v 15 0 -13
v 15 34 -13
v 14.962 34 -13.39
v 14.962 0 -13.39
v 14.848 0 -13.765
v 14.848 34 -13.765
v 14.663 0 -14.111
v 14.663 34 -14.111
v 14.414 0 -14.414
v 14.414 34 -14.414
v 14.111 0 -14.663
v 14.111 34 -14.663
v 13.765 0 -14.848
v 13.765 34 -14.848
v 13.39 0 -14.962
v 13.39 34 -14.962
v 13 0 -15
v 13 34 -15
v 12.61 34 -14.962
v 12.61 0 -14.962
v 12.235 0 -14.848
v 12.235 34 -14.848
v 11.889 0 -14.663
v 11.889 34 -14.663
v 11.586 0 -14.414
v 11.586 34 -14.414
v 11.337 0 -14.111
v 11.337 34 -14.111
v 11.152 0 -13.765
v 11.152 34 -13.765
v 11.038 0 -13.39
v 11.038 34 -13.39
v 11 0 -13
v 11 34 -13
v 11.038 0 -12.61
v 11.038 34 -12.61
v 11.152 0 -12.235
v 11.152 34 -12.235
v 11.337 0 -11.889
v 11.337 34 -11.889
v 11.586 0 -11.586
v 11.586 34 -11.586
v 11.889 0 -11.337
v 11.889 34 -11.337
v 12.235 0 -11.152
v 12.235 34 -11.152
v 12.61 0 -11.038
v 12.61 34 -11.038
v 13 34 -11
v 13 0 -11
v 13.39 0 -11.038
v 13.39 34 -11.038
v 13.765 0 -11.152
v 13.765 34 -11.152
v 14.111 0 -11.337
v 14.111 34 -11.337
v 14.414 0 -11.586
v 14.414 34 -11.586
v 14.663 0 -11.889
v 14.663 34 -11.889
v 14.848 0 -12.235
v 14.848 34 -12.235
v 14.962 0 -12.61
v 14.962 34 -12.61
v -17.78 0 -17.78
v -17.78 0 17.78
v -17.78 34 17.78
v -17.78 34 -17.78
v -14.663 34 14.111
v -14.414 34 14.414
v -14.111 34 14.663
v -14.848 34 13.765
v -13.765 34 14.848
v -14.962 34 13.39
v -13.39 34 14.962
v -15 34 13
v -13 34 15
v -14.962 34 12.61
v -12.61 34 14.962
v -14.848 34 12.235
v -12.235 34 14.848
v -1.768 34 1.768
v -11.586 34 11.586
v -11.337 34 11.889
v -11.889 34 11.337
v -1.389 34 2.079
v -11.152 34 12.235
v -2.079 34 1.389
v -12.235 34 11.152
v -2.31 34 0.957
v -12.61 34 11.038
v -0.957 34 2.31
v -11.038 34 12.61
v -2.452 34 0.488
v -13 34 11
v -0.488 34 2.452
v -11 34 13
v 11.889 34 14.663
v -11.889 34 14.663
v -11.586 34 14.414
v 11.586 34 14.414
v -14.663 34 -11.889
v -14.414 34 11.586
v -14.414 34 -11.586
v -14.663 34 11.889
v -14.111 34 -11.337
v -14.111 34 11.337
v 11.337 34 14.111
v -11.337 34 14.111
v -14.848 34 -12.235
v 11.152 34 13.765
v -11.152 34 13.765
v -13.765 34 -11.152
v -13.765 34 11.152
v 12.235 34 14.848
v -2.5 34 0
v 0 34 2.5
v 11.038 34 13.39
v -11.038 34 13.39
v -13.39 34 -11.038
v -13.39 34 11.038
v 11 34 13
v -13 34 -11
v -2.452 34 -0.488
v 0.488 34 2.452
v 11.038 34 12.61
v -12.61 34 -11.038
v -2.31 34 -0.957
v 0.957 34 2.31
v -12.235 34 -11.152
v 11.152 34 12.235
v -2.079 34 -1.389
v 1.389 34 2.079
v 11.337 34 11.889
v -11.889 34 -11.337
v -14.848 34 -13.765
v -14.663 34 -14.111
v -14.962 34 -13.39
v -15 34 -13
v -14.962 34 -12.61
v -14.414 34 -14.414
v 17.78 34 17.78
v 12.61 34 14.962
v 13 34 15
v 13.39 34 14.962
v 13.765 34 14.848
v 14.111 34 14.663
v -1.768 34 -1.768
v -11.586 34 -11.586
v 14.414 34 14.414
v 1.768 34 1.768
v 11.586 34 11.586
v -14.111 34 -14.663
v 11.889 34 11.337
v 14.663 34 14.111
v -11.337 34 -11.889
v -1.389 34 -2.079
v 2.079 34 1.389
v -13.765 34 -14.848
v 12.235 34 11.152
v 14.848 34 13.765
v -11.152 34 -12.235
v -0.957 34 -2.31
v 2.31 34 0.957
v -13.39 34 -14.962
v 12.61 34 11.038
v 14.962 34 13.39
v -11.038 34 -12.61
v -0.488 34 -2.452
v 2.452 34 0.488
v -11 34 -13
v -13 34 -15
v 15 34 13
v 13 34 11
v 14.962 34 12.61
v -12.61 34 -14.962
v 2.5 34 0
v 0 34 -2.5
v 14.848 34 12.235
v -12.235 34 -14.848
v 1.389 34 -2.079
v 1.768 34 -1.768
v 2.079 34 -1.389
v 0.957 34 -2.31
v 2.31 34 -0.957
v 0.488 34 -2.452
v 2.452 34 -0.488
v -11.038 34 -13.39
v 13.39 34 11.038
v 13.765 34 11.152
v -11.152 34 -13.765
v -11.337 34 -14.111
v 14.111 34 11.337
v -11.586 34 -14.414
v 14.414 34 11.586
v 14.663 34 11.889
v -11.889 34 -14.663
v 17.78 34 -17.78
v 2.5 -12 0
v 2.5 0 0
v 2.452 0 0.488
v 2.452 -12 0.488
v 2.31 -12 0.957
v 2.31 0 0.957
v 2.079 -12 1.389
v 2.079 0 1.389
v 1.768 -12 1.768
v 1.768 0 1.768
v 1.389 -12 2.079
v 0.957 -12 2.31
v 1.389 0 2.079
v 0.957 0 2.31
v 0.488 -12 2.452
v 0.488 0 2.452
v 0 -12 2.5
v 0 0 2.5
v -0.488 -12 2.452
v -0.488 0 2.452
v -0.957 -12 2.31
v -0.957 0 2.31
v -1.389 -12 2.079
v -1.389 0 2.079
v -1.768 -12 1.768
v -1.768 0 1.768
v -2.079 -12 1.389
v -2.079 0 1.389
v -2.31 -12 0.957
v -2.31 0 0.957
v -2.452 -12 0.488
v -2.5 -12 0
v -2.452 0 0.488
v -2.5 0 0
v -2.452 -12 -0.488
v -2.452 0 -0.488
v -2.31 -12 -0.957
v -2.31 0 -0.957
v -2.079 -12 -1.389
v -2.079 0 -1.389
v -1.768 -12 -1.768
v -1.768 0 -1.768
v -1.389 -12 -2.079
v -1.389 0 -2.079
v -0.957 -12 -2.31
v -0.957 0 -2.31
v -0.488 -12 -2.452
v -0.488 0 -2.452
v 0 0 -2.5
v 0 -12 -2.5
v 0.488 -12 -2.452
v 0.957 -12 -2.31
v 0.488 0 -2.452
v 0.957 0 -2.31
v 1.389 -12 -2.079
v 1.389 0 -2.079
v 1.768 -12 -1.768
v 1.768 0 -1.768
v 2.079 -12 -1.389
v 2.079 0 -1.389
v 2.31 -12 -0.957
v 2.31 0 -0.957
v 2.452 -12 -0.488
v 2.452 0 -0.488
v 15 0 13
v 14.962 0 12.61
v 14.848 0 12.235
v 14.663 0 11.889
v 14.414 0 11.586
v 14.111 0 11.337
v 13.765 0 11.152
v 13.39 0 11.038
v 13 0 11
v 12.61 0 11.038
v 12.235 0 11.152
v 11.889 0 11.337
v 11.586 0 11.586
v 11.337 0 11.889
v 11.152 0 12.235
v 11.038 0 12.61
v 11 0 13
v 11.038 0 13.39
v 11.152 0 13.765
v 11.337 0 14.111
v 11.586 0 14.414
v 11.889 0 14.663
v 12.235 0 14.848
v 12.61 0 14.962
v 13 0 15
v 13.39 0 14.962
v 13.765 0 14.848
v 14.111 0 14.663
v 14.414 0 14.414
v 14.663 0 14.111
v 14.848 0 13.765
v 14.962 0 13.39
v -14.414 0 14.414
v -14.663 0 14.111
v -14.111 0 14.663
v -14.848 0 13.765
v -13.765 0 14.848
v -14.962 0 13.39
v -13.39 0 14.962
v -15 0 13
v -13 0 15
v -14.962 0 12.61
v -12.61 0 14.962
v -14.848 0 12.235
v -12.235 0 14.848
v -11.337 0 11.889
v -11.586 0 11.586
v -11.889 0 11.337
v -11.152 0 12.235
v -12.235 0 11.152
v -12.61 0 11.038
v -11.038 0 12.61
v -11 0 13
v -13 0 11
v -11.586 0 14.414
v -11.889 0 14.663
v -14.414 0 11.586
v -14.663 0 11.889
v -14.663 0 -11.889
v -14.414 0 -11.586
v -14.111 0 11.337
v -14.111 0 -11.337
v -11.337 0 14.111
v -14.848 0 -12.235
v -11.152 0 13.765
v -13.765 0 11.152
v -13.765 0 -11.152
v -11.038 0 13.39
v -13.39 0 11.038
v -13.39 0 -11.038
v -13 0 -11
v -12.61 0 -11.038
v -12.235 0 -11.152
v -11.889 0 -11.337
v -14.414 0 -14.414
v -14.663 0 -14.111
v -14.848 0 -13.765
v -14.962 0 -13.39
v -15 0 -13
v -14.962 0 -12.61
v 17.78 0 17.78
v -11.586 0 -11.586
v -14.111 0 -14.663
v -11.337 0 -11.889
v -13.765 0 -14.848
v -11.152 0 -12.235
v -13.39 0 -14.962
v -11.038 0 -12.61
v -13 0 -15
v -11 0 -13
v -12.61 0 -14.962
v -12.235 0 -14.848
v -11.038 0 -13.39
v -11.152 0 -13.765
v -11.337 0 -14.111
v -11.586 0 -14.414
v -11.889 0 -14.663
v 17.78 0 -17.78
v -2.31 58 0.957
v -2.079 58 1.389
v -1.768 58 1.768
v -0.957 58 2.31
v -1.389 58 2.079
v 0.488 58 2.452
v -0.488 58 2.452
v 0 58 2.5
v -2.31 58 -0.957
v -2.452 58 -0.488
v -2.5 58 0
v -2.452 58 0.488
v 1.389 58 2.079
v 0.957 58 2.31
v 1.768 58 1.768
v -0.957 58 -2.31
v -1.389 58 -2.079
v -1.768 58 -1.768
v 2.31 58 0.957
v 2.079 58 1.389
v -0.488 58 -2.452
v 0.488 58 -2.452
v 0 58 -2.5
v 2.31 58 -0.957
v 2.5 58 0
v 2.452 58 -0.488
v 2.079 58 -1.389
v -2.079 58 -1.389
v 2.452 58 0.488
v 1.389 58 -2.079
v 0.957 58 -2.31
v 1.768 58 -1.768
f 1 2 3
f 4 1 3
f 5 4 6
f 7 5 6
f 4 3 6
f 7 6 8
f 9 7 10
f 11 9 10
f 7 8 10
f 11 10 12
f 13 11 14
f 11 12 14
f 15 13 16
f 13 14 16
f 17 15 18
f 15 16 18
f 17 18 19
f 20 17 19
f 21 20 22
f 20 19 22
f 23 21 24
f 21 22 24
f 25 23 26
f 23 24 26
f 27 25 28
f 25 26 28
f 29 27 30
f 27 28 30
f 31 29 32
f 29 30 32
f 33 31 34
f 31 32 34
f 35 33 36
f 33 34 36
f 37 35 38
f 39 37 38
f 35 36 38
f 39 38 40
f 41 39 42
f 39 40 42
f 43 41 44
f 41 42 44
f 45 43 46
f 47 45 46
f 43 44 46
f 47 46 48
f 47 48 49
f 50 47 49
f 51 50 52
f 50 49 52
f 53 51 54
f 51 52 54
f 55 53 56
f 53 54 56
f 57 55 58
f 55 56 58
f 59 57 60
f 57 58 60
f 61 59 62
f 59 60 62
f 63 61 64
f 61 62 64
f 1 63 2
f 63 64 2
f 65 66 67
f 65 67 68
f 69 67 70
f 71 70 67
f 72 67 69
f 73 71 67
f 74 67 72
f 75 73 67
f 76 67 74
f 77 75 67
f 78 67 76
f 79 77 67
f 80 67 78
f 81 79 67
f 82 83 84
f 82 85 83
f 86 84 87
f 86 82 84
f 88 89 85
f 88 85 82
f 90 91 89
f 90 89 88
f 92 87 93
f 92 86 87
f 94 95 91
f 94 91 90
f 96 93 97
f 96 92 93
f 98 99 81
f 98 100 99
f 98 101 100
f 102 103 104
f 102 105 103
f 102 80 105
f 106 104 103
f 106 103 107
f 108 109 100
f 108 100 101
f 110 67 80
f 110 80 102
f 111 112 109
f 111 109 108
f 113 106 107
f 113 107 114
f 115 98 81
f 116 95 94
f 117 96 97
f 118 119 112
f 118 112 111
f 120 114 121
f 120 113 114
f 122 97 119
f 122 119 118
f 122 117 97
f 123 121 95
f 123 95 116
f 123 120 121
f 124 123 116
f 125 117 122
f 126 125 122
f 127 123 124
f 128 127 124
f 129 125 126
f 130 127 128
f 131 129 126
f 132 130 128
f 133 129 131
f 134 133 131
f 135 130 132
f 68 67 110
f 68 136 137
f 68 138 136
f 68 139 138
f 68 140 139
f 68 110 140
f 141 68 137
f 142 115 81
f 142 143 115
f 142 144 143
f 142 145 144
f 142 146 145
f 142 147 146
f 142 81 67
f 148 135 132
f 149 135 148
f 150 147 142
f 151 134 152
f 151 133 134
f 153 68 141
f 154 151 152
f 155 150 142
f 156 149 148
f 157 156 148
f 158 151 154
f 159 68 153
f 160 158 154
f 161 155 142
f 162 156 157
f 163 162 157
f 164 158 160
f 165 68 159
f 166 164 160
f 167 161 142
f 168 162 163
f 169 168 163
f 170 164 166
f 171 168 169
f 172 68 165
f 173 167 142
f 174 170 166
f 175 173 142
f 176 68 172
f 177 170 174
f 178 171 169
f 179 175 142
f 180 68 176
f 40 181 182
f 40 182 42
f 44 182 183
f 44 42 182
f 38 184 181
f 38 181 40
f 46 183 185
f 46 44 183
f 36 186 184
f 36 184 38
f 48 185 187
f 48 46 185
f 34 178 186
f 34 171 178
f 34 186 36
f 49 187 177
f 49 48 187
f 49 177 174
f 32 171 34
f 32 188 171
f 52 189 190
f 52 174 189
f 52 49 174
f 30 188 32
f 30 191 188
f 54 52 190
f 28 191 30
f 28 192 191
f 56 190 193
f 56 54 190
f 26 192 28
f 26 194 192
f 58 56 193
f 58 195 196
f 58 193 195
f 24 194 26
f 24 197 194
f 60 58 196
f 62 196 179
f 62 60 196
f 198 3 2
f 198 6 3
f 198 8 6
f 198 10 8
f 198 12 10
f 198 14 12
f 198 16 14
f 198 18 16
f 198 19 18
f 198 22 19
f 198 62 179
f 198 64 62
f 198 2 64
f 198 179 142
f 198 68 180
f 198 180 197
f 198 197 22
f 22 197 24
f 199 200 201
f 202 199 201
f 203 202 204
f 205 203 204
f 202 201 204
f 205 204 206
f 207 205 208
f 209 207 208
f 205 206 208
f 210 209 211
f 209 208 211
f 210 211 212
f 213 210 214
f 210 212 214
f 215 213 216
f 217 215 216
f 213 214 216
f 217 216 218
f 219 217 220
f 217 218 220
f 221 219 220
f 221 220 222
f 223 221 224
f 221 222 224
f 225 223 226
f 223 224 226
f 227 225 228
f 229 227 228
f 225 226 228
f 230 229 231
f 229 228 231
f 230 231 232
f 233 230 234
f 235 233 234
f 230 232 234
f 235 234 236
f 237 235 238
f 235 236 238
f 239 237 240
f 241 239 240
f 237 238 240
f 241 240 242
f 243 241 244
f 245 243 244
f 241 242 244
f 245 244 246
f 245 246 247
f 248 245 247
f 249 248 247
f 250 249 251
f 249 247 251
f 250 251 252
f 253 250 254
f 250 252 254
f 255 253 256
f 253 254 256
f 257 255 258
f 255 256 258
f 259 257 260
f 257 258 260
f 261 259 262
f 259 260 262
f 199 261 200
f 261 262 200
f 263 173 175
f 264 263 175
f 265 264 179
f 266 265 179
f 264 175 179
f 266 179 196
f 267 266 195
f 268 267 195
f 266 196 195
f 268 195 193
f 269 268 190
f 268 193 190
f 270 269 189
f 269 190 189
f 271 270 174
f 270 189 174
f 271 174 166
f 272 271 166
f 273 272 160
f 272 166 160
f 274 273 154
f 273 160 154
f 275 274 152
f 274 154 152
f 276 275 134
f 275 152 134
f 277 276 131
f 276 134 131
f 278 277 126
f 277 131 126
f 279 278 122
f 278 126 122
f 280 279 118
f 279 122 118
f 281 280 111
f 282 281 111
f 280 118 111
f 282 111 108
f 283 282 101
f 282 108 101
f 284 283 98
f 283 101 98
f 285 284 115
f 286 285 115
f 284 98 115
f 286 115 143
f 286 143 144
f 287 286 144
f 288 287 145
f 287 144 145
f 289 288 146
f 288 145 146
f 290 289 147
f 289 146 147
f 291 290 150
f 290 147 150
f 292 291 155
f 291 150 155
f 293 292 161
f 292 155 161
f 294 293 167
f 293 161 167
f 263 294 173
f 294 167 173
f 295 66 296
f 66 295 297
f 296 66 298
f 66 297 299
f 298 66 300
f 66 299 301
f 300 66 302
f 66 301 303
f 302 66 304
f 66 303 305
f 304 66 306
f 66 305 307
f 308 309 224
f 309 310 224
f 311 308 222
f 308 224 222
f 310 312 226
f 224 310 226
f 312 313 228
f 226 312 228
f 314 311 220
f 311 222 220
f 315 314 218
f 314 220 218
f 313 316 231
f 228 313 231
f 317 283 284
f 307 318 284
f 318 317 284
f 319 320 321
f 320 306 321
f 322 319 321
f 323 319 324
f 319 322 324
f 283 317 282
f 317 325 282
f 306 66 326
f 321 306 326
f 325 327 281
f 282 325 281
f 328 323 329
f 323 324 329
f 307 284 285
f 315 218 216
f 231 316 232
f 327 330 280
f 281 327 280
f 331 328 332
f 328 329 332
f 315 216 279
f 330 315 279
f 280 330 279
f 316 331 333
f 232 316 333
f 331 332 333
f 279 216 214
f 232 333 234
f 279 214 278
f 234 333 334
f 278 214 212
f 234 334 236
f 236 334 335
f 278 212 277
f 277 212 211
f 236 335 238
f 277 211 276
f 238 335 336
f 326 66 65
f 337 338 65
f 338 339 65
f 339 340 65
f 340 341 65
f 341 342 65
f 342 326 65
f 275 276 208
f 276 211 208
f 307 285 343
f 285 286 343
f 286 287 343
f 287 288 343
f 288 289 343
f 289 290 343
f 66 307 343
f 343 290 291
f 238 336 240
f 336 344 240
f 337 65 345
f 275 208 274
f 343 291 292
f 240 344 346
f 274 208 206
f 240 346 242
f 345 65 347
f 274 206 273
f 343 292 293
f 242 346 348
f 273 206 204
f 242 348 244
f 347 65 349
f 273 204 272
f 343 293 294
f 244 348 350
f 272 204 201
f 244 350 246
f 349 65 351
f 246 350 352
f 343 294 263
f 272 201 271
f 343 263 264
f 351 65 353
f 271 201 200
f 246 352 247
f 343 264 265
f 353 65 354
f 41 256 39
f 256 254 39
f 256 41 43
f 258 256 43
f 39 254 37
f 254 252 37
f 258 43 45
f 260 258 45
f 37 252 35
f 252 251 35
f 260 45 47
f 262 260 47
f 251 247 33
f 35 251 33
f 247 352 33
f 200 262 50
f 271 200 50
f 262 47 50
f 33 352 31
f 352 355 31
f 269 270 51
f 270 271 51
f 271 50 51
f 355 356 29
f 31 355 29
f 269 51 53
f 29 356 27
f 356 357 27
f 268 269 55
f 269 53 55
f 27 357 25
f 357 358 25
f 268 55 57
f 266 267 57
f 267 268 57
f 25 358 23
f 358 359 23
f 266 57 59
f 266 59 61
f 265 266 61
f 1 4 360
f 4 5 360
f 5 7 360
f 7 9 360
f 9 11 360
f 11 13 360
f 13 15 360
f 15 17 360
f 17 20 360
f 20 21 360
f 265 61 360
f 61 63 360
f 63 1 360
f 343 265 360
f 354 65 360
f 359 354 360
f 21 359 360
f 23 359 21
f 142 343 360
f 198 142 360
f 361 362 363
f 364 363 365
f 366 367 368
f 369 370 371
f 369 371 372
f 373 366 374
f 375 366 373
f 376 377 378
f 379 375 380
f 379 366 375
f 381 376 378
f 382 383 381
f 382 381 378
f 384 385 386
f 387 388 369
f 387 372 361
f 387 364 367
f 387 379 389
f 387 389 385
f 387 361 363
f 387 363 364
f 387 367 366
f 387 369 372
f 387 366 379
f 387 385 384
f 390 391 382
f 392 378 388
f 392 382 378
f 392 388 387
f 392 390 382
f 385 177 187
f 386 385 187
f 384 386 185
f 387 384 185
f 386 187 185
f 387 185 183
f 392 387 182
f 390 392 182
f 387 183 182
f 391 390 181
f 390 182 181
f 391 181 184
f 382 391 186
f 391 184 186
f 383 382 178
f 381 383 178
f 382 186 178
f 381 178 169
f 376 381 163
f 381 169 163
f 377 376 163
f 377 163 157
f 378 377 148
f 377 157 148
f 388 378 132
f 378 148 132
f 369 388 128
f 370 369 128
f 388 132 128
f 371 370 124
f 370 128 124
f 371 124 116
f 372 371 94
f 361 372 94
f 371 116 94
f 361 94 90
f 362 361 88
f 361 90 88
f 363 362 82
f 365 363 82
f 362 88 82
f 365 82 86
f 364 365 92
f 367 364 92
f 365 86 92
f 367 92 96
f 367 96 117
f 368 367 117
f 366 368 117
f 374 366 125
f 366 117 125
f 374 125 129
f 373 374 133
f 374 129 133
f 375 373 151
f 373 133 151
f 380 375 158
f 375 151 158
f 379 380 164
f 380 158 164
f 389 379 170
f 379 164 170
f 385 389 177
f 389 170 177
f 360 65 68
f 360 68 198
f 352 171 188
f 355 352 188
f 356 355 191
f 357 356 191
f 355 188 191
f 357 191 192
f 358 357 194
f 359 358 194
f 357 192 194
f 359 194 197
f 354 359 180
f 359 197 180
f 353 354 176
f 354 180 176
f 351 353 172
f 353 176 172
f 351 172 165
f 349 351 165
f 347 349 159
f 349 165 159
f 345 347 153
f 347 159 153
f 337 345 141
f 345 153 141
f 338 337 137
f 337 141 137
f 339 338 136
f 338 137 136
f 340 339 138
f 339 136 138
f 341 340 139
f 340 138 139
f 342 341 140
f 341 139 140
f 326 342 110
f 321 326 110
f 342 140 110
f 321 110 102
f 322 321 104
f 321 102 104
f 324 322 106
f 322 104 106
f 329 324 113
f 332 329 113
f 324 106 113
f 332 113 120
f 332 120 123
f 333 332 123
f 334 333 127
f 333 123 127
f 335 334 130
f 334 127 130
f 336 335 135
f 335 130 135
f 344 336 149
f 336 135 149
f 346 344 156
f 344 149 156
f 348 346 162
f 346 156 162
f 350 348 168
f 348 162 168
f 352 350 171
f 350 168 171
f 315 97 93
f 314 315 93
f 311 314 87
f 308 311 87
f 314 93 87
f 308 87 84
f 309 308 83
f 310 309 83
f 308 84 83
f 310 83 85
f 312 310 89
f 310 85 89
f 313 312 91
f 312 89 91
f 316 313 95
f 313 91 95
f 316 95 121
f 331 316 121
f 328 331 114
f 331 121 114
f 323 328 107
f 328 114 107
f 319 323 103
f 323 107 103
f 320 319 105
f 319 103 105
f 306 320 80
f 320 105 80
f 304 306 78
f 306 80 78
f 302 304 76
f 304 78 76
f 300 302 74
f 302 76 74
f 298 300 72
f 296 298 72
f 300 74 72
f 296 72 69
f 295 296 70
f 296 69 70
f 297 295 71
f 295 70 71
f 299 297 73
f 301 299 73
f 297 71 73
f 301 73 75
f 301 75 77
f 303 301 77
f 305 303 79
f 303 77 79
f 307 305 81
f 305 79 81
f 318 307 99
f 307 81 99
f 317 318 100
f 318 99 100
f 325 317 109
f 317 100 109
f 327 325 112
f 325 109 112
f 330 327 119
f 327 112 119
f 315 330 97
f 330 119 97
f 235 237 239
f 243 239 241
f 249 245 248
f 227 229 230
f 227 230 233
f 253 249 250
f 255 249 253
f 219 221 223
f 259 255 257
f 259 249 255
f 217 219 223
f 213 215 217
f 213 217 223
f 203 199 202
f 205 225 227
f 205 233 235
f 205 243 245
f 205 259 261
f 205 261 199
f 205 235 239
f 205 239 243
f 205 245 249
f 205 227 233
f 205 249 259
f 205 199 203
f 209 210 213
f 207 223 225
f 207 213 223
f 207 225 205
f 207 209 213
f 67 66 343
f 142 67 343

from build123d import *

# Parameters (mm, degrees)
SKETCH1_W           = 35.56
SKETCH1_H           = 35.56
BOSS_EXTRUDE1_DEPTH = 34
SKETCH2_R           = 2.5
BOSS_EXTRUDE2_DEPTH = 24
SKETCH3_R           = 2.5
BOSS_EXTRUDE3_DEPTH = 12
SKETCH4_R           = 2
CUT_EXTRUDE1_DEPTH  = 34


with BuildPart() as part:
    # Sketch1 → Boss-Extrude1 (new body)
    with BuildSketch(Plane(origin=(0, 0, 0), x_dir=(1, 0, 0), z_dir=(0, 1, 0))):
        Rectangle(SKETCH1_W, SKETCH1_H)
    extrude(amount=BOSS_EXTRUDE1_DEPTH)

    # Sketch2 → Boss-Extrude2 (add)
    with BuildSketch(Plane(origin=(0, 34, 0), x_dir=(1, 0, 0), z_dir=(0, 1, 0))):
        Circle(SKETCH2_R)
    extrude(amount=BOSS_EXTRUDE2_DEPTH)

    # Sketch3 → Boss-Extrude3 (add)
    with BuildSketch(Plane.XZ):
        Circle(SKETCH3_R)
    extrude(amount=BOSS_EXTRUDE3_DEPTH)

    # Sketch4 → Cut-Extrude1 (cut)
    with BuildSketch(Plane(origin=(0, 34, 0), x_dir=(1, 0, 0), z_dir=(0, 1, 0))):
        with Locations((-13, 13)):
            Circle(SKETCH4_R)
        with Locations((13, 13)):
            Circle(SKETCH4_R)
        with Locations((13, -13)):
            Circle(SKETCH4_R)
        with Locations((-13, -13)):
            Circle(SKETCH4_R)
    extrude(amount=-CUT_EXTRUDE1_DEPTH, mode=Mode.SUBTRACT)


solid = part.part
